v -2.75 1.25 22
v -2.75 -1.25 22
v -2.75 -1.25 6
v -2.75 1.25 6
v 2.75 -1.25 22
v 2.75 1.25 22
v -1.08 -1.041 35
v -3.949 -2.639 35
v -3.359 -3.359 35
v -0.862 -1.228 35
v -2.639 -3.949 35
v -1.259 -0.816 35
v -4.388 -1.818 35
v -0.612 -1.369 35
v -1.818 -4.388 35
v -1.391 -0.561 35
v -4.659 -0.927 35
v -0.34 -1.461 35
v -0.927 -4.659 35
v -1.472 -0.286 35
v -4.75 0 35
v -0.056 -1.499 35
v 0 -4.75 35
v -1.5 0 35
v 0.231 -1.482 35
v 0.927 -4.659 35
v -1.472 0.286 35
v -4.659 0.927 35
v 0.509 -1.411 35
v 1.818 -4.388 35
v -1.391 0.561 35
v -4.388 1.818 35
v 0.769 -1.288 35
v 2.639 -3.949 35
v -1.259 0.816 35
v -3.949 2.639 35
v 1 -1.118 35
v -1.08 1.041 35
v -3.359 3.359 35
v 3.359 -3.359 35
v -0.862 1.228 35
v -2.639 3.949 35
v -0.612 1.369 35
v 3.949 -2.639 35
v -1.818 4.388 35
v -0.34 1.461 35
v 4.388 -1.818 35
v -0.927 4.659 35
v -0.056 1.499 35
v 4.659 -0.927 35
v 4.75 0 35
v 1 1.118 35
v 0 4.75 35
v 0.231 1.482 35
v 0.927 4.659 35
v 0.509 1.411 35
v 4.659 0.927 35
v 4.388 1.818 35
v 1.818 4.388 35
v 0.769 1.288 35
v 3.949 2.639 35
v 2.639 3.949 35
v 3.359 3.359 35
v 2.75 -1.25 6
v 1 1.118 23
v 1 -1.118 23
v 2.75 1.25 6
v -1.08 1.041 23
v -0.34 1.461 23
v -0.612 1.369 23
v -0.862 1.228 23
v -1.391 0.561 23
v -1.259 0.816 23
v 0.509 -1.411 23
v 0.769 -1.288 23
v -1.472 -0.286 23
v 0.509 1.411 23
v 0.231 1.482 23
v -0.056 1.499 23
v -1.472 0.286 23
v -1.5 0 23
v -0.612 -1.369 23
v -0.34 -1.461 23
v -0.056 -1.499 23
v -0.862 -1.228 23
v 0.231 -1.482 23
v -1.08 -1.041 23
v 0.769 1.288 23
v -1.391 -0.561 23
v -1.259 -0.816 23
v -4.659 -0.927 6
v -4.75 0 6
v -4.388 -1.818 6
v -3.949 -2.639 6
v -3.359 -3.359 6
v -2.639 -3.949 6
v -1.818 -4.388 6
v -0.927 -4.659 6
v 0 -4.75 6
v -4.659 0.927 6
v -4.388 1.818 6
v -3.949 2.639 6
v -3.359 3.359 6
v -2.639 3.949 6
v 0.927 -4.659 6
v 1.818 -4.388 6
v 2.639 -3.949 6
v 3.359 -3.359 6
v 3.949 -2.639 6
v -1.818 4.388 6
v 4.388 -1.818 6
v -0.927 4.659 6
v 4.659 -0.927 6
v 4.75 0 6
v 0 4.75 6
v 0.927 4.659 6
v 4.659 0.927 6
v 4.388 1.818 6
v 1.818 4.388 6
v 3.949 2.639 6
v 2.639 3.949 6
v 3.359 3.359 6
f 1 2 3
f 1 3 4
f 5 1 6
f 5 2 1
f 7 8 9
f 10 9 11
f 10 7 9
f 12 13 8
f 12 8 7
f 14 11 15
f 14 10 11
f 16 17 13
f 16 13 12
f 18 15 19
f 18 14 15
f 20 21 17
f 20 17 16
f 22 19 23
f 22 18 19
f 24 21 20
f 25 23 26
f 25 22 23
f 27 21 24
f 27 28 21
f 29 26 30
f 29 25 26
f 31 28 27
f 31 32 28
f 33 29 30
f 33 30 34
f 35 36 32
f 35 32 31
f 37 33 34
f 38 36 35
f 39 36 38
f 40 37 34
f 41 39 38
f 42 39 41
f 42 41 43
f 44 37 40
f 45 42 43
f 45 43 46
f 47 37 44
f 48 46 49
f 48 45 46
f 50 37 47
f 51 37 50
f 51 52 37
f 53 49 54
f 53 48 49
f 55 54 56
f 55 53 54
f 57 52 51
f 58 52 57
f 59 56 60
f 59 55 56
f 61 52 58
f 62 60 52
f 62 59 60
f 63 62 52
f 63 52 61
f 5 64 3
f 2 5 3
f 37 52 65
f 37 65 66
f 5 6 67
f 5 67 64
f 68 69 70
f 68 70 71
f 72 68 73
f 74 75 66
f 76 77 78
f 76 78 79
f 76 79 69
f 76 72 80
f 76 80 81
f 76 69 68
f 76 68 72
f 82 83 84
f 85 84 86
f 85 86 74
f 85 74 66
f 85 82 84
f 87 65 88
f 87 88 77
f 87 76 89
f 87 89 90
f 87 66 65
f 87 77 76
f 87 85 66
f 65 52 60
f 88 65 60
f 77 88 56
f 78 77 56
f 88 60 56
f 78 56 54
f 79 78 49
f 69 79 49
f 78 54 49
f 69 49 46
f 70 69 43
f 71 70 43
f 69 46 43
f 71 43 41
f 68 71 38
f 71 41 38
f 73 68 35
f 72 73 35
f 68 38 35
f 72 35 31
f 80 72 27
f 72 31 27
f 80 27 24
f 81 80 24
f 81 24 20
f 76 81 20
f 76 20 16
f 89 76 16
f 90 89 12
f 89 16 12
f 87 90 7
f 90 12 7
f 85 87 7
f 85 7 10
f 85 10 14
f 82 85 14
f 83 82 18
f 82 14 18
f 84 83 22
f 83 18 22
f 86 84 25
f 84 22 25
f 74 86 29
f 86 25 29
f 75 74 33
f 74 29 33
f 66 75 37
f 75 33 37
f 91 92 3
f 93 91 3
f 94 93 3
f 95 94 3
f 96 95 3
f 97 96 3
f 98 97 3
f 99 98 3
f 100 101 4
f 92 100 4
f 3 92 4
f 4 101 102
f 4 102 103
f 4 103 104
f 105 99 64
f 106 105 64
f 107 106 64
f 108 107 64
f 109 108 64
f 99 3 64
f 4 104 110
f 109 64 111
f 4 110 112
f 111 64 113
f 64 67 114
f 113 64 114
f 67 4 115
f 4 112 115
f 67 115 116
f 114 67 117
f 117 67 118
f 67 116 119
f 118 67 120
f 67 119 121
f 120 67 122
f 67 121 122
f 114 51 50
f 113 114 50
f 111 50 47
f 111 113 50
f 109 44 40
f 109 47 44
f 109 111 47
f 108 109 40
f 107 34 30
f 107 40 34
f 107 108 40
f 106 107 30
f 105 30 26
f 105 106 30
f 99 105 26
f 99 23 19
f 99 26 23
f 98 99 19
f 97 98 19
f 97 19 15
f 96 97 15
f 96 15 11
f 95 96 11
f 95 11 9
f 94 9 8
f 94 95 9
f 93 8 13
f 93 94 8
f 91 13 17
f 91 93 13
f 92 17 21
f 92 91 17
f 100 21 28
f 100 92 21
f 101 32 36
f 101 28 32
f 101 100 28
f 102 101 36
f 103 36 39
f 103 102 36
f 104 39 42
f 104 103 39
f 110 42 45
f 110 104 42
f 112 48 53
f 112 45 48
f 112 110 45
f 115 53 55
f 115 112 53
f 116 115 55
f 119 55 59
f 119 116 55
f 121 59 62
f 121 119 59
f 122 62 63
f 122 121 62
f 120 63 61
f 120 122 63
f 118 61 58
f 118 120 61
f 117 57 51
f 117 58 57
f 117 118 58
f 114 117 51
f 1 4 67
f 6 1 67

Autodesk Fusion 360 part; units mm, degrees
sketch "Sketch1" plane through (0, 0, 0) normal (0, 0, 1) x (1, 0, 0)
  circle A0 centre (0, 0) radius 4.75
  dimension "d1" = 9.5
extrude "Extrude1" add sketch "Sketch1" along normal blind 35
sketch "Sketch2" plane through (0, 0, 35) normal (0, 0, 1) x (-1, 0, 0)
  circle A0 centre (0, 0) radius 4.75
  arc A1 (-1, -1.118) -> (-1, 1.118) centre (0, 0) ccw
  line L0 (-1, -1.118) -> (-1, 1.118)
extrude "Extrude2" cut sketch "Sketch2" against normal blind 12 contours A1 L0
sketch "Sketch3" plane through (0, 0, 0) normal (0, 0, -1) x (1, 0, 0)
  circle A0 centre (0, 0) radius 4.75
  line L0 (2.75, 1.25) -> (-2.75, 1.25)
  line L1 (-2.75, 1.25) -> (-2.75, -1.25)
  line L2 (-2.75, -1.25) -> (2.75, -1.25)
  line L3 (2.75, -1.25) -> (2.75, 1.25)
  dimension "d9" = 5.5
  dimension "d10" = 2.5
extrude "Extrude3" cut sketch "Sketch3" against normal blind 18 contours L0 L1 L2 L3
extrude "Extrude4" cut 1 faces at (-0.9167, -0.4167, 18) along direction (0, 0, 1) blind 4
extrude "Extrude5" cut 1 faces at (0.1183, 2.4122, 0) along direction (0, 0, 1) blind 5
extrude "Extrude6" cut 1 faces at (0.1183, 2.4122, 5) along direction (0, 0, 1) blind 1
